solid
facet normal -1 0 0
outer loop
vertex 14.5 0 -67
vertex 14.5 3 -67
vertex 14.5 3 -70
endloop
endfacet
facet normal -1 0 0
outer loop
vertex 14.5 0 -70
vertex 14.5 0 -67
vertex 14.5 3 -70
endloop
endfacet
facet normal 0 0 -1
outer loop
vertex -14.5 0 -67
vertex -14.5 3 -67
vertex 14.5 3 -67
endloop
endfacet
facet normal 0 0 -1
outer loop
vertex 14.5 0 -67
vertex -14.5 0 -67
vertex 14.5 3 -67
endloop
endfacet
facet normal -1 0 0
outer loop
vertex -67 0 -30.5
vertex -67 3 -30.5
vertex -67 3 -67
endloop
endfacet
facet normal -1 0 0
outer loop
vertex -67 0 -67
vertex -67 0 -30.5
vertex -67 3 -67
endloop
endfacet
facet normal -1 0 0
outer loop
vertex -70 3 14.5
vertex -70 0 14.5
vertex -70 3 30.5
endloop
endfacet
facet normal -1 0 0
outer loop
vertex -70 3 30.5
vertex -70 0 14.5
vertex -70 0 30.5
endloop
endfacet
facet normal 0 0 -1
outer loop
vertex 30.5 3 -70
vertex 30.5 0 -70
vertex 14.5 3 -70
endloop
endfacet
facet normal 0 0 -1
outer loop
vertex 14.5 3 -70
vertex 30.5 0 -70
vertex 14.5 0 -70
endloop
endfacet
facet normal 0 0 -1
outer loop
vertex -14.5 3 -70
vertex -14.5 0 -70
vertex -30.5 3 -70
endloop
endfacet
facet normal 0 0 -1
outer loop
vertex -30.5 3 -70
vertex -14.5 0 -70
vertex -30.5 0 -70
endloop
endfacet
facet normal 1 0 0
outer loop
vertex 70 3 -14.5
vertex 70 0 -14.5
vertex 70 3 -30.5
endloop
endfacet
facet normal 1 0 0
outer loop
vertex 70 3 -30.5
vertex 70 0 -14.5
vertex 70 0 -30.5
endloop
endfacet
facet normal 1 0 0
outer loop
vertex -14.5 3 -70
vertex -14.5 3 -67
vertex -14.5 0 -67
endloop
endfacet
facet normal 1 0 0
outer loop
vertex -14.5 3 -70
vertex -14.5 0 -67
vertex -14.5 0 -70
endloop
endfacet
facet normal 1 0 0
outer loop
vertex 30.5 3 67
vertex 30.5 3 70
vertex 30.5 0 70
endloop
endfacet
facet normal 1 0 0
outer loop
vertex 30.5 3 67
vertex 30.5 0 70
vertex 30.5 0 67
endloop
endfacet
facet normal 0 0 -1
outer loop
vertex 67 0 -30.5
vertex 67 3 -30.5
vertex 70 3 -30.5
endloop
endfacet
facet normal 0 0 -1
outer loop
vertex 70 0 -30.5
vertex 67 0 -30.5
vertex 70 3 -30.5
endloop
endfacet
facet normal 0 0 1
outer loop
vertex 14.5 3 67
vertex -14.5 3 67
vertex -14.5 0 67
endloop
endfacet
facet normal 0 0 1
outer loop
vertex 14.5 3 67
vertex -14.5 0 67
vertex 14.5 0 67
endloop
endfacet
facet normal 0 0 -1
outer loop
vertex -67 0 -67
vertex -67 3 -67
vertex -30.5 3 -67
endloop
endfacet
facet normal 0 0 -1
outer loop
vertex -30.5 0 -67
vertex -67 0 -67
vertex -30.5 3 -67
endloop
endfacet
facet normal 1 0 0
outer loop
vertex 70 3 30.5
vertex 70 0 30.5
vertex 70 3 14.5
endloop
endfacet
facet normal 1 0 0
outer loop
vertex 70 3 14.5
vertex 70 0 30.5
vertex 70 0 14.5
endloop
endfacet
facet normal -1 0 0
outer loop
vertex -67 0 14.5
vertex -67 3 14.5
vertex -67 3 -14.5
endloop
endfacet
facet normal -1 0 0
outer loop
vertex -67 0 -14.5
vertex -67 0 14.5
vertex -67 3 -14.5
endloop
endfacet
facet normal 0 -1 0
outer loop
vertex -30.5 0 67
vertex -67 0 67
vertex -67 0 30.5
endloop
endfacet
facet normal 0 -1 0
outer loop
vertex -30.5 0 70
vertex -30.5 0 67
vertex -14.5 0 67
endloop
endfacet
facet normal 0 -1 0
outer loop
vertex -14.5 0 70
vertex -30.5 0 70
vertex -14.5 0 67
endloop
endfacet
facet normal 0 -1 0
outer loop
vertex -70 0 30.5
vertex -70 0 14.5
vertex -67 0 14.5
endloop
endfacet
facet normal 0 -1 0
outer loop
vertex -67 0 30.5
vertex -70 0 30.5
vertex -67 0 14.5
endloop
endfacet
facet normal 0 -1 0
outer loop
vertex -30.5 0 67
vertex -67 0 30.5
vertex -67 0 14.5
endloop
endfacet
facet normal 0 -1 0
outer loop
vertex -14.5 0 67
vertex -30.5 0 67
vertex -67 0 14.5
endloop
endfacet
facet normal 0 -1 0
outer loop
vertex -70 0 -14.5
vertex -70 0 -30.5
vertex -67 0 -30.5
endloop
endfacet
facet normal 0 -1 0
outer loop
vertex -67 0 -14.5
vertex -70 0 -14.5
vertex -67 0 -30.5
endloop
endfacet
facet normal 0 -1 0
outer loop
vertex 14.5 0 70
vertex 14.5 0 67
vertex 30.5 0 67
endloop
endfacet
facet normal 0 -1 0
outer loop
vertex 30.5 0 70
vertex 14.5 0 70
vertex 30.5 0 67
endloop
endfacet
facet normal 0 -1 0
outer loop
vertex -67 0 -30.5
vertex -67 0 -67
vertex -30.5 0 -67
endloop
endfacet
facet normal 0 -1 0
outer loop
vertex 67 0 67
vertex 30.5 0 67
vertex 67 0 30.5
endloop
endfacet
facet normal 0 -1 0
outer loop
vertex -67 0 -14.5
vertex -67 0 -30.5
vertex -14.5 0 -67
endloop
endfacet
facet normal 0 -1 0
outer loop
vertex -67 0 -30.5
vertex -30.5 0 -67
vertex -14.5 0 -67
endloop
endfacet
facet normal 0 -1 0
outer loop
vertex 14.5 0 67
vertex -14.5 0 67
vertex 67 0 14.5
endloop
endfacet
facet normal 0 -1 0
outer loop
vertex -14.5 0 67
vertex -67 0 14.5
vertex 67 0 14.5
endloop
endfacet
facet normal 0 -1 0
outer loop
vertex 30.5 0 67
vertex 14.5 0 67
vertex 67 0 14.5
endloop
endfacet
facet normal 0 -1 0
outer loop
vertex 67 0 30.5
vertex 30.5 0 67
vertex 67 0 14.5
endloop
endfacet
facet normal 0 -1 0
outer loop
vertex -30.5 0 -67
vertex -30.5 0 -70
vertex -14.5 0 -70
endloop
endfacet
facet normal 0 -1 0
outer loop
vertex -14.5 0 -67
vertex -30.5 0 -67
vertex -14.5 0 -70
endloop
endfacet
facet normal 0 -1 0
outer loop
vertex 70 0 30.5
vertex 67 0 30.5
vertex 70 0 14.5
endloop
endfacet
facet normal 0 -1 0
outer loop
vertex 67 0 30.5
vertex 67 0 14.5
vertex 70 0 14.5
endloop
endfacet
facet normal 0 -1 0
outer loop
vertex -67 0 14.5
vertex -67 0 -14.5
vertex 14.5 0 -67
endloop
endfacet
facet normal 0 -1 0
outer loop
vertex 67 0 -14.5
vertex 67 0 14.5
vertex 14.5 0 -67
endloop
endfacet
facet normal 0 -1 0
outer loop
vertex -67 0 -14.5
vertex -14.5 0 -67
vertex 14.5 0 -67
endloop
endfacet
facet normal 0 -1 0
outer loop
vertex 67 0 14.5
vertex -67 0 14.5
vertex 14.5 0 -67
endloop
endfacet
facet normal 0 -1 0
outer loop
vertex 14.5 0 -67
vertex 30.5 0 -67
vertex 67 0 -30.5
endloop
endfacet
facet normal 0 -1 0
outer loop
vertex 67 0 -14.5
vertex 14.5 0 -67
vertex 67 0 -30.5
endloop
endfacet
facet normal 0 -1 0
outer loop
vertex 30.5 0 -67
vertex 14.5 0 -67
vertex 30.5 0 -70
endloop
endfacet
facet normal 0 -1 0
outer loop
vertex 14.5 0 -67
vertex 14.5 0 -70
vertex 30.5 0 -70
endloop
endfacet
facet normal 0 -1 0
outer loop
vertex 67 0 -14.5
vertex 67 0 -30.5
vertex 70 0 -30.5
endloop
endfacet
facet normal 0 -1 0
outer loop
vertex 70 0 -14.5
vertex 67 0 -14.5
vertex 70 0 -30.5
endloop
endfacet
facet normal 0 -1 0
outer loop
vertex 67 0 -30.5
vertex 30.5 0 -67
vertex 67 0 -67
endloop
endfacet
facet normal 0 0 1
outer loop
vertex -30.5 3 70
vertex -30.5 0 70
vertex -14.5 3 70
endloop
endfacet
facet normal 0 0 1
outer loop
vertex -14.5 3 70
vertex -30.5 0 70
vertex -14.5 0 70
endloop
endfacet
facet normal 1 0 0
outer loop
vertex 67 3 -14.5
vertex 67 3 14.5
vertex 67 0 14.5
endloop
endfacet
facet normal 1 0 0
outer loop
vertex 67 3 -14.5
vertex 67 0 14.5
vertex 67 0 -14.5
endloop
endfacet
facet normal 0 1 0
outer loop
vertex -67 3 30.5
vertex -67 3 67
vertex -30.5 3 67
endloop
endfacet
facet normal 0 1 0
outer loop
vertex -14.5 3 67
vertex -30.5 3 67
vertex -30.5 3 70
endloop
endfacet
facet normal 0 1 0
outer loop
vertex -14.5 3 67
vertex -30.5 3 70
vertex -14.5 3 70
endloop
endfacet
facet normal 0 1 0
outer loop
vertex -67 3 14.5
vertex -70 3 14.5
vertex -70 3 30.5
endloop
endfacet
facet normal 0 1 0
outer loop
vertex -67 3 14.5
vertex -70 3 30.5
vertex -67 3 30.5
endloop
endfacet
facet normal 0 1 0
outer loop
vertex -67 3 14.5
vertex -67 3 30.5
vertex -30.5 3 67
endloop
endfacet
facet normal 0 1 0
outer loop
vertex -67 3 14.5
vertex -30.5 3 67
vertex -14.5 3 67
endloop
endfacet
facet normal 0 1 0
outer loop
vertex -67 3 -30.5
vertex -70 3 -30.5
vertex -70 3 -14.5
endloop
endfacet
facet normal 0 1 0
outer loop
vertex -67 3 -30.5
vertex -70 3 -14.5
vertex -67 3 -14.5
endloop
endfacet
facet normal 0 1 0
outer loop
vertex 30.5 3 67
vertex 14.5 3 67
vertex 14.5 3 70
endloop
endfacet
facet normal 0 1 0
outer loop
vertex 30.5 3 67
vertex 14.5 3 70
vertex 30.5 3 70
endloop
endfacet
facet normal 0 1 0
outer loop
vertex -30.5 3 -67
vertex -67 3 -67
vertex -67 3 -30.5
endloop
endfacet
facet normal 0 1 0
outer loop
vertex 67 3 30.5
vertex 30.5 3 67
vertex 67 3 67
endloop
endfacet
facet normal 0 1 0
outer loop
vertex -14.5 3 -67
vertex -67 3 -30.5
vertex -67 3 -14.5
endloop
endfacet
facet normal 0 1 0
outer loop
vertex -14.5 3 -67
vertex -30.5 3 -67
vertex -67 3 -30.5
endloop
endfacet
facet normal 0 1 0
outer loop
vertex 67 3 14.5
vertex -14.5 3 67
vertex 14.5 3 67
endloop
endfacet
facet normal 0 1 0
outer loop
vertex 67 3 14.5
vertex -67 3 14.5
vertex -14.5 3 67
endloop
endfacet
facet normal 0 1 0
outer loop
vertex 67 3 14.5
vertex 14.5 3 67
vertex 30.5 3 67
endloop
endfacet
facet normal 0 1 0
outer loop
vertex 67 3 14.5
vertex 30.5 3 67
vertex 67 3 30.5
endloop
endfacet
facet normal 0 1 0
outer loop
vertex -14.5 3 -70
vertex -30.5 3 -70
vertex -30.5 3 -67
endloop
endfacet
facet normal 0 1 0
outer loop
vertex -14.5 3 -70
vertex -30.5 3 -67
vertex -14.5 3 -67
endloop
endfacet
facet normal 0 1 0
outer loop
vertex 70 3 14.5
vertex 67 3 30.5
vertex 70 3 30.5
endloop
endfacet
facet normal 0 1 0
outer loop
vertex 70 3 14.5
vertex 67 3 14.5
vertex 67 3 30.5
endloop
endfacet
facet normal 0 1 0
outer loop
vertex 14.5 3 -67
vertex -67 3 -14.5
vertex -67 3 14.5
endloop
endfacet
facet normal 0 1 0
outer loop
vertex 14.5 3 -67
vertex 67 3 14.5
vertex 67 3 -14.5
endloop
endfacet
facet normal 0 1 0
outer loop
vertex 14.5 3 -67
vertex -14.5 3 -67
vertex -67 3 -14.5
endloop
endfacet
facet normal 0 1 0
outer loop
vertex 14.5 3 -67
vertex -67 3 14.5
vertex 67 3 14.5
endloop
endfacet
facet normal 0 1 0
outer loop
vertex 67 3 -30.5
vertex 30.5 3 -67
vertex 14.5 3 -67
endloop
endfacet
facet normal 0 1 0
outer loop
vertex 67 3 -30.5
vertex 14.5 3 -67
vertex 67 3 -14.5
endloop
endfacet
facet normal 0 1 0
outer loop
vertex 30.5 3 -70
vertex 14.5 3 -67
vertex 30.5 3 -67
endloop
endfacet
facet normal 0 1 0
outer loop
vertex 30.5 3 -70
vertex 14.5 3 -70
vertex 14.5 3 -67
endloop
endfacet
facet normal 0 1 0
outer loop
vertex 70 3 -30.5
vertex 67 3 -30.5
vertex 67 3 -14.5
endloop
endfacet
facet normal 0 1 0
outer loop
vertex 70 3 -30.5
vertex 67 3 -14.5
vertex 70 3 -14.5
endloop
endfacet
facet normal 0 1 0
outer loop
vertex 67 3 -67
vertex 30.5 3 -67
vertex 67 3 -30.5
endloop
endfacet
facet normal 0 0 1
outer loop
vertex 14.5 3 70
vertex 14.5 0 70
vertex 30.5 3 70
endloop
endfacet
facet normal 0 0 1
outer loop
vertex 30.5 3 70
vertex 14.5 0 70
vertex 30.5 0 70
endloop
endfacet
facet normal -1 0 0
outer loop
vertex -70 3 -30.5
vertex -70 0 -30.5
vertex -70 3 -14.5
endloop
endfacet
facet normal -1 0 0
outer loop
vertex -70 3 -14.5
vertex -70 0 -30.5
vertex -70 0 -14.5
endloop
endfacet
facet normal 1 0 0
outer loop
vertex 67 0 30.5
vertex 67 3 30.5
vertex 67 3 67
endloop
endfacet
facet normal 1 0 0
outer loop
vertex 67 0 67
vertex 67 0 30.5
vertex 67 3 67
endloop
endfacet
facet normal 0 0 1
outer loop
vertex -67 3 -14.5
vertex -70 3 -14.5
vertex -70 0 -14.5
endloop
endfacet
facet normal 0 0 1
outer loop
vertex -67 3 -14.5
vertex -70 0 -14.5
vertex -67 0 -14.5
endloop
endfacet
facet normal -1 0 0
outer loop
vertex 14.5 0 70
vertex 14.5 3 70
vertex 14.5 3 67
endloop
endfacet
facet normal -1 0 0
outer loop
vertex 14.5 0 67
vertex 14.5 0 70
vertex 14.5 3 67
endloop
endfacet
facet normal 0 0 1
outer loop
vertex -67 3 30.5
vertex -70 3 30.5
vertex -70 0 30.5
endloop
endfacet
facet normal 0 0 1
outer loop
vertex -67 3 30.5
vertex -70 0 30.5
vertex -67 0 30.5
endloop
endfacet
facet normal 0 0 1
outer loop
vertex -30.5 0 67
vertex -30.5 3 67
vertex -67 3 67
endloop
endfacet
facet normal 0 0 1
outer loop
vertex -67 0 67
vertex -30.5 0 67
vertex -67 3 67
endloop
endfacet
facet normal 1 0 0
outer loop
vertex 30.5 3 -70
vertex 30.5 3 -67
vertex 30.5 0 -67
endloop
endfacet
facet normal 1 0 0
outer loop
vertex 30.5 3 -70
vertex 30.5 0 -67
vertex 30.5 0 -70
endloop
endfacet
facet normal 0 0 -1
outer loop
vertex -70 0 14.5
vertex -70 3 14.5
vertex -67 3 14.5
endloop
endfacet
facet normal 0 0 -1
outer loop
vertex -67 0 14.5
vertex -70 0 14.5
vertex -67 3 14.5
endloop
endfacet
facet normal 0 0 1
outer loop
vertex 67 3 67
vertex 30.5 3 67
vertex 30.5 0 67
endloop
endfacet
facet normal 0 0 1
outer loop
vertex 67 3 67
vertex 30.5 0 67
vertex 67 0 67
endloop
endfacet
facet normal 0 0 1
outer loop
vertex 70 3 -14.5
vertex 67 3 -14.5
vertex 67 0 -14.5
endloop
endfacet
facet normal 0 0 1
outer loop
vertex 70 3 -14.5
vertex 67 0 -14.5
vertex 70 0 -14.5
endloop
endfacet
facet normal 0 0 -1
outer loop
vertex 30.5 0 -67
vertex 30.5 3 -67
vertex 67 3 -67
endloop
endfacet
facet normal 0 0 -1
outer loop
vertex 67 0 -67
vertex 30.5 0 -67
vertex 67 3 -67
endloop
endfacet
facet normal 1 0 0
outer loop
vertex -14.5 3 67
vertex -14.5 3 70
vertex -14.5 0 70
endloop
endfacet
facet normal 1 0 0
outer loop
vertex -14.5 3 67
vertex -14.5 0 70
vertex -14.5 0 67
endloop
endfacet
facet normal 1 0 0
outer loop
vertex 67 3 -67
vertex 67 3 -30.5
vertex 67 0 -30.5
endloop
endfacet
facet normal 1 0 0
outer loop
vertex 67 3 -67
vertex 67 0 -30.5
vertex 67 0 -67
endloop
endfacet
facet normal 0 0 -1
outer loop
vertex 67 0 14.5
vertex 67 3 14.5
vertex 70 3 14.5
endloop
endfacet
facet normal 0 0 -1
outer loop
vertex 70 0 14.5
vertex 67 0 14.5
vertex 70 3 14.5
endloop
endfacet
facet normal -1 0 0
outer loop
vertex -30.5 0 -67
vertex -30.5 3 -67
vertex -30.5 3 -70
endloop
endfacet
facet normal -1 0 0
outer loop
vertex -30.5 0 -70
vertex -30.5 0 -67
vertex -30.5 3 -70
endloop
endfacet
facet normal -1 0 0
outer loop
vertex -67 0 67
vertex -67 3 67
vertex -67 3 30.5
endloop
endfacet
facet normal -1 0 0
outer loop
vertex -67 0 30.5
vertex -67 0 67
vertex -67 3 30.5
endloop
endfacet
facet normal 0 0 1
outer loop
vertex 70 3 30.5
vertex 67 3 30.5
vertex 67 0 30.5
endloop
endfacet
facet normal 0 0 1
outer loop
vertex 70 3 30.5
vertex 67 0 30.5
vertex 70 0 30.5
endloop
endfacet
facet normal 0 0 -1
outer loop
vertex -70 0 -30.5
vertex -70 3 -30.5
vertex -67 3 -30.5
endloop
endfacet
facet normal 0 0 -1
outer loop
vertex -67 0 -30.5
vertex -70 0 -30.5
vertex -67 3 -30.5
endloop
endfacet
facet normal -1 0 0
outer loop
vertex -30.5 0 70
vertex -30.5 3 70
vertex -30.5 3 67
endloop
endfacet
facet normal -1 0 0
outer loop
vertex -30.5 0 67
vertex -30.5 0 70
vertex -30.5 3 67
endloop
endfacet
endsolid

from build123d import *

# Parameters (mm, degrees)
BOSS_EXTRUDE1_DEPTH = 3
SKETCH2_W           = 3
SKETCH2_H           = 3
SKETCH2_H_2         = 36.5
SKETCH2_W_2         = 36.5
SKETCH2_W_3         = 29
SKETCH2_H_3         = 29
CUT_EXTRUDE2_DEPTH  = 3


with BuildPart() as part:
    # Sketch1 → Boss-Extrude1 (new body)
    with BuildSketch(Plane(origin=(0, 0, 0), x_dir=(1, 0, 0), z_dir=(0, 1, 0))):
        Polygon((70, 70), (-70, 70), (0, 0), align=None)
        Polygon((0, 0), (-70, 70), (-70, -70), align=None)
        Polygon((70, -70), (0, 0), (-70, -70), align=None)
        Polygon((70, 70), (0, 0), (70, -70), align=None)
    extrude(amount=BOSS_EXTRUDE1_DEPTH)

    # Sketch2 → Cut-Extrude2 (cut)
    with BuildSketch(Plane(origin=(0, 3, 0), x_dir=(1, 0, 0), z_dir=(0, 1, 0))):
        with Locations((-68.5, 68.5)):
            Rectangle(SKETCH2_W, SKETCH2_H)
        with Locations((-68.5, 48.75)):
            Rectangle(SKETCH2_W, SKETCH2_H_2)
        with Locations((-48.75, 68.5)):
            Rectangle(SKETCH2_W_2, SKETCH2_H)
        with Locations((48.75, 68.5)):
            Rectangle(SKETCH2_W_2, SKETCH2_H)
        with Locations((68.5, 68.5)):
            Rectangle(SKETCH2_W, SKETCH2_H)
        with Locations((68.5, 48.75)):
            Rectangle(SKETCH2_W, SKETCH2_H_2)
        with Locations((68.5, -68.5)):
            Rectangle(SKETCH2_W, SKETCH2_H)
        with Locations((68.5, -48.75)):
            Rectangle(SKETCH2_W, SKETCH2_H_2)
        with Locations((48.75, -68.5)):
            Rectangle(SKETCH2_W_2, SKETCH2_H)
        with Locations((-48.75, -68.5)):
            Rectangle(SKETCH2_W_2, SKETCH2_H)
        with Locations((-68.5, -68.5)):
            Rectangle(SKETCH2_W, SKETCH2_H)
        with Locations((-68.5, -48.75)):
            Rectangle(SKETCH2_W, SKETCH2_H_2)
        with Locations((0, 68.5)):
            Rectangle(SKETCH2_W_3, SKETCH2_H)
        with Locations((0, -68.5)):
            Rectangle(SKETCH2_W_3, SKETCH2_H)
        with Locations((68.5, 0)):
            Rectangle(SKETCH2_W, SKETCH2_H_3)
        with Locations((-68.5, 0)):
            Rectangle(SKETCH2_W, SKETCH2_H_3)
    extrude(amount=-CUT_EXTRUDE2_DEPTH, mode=Mode.SUBTRACT)


solid = part.part
